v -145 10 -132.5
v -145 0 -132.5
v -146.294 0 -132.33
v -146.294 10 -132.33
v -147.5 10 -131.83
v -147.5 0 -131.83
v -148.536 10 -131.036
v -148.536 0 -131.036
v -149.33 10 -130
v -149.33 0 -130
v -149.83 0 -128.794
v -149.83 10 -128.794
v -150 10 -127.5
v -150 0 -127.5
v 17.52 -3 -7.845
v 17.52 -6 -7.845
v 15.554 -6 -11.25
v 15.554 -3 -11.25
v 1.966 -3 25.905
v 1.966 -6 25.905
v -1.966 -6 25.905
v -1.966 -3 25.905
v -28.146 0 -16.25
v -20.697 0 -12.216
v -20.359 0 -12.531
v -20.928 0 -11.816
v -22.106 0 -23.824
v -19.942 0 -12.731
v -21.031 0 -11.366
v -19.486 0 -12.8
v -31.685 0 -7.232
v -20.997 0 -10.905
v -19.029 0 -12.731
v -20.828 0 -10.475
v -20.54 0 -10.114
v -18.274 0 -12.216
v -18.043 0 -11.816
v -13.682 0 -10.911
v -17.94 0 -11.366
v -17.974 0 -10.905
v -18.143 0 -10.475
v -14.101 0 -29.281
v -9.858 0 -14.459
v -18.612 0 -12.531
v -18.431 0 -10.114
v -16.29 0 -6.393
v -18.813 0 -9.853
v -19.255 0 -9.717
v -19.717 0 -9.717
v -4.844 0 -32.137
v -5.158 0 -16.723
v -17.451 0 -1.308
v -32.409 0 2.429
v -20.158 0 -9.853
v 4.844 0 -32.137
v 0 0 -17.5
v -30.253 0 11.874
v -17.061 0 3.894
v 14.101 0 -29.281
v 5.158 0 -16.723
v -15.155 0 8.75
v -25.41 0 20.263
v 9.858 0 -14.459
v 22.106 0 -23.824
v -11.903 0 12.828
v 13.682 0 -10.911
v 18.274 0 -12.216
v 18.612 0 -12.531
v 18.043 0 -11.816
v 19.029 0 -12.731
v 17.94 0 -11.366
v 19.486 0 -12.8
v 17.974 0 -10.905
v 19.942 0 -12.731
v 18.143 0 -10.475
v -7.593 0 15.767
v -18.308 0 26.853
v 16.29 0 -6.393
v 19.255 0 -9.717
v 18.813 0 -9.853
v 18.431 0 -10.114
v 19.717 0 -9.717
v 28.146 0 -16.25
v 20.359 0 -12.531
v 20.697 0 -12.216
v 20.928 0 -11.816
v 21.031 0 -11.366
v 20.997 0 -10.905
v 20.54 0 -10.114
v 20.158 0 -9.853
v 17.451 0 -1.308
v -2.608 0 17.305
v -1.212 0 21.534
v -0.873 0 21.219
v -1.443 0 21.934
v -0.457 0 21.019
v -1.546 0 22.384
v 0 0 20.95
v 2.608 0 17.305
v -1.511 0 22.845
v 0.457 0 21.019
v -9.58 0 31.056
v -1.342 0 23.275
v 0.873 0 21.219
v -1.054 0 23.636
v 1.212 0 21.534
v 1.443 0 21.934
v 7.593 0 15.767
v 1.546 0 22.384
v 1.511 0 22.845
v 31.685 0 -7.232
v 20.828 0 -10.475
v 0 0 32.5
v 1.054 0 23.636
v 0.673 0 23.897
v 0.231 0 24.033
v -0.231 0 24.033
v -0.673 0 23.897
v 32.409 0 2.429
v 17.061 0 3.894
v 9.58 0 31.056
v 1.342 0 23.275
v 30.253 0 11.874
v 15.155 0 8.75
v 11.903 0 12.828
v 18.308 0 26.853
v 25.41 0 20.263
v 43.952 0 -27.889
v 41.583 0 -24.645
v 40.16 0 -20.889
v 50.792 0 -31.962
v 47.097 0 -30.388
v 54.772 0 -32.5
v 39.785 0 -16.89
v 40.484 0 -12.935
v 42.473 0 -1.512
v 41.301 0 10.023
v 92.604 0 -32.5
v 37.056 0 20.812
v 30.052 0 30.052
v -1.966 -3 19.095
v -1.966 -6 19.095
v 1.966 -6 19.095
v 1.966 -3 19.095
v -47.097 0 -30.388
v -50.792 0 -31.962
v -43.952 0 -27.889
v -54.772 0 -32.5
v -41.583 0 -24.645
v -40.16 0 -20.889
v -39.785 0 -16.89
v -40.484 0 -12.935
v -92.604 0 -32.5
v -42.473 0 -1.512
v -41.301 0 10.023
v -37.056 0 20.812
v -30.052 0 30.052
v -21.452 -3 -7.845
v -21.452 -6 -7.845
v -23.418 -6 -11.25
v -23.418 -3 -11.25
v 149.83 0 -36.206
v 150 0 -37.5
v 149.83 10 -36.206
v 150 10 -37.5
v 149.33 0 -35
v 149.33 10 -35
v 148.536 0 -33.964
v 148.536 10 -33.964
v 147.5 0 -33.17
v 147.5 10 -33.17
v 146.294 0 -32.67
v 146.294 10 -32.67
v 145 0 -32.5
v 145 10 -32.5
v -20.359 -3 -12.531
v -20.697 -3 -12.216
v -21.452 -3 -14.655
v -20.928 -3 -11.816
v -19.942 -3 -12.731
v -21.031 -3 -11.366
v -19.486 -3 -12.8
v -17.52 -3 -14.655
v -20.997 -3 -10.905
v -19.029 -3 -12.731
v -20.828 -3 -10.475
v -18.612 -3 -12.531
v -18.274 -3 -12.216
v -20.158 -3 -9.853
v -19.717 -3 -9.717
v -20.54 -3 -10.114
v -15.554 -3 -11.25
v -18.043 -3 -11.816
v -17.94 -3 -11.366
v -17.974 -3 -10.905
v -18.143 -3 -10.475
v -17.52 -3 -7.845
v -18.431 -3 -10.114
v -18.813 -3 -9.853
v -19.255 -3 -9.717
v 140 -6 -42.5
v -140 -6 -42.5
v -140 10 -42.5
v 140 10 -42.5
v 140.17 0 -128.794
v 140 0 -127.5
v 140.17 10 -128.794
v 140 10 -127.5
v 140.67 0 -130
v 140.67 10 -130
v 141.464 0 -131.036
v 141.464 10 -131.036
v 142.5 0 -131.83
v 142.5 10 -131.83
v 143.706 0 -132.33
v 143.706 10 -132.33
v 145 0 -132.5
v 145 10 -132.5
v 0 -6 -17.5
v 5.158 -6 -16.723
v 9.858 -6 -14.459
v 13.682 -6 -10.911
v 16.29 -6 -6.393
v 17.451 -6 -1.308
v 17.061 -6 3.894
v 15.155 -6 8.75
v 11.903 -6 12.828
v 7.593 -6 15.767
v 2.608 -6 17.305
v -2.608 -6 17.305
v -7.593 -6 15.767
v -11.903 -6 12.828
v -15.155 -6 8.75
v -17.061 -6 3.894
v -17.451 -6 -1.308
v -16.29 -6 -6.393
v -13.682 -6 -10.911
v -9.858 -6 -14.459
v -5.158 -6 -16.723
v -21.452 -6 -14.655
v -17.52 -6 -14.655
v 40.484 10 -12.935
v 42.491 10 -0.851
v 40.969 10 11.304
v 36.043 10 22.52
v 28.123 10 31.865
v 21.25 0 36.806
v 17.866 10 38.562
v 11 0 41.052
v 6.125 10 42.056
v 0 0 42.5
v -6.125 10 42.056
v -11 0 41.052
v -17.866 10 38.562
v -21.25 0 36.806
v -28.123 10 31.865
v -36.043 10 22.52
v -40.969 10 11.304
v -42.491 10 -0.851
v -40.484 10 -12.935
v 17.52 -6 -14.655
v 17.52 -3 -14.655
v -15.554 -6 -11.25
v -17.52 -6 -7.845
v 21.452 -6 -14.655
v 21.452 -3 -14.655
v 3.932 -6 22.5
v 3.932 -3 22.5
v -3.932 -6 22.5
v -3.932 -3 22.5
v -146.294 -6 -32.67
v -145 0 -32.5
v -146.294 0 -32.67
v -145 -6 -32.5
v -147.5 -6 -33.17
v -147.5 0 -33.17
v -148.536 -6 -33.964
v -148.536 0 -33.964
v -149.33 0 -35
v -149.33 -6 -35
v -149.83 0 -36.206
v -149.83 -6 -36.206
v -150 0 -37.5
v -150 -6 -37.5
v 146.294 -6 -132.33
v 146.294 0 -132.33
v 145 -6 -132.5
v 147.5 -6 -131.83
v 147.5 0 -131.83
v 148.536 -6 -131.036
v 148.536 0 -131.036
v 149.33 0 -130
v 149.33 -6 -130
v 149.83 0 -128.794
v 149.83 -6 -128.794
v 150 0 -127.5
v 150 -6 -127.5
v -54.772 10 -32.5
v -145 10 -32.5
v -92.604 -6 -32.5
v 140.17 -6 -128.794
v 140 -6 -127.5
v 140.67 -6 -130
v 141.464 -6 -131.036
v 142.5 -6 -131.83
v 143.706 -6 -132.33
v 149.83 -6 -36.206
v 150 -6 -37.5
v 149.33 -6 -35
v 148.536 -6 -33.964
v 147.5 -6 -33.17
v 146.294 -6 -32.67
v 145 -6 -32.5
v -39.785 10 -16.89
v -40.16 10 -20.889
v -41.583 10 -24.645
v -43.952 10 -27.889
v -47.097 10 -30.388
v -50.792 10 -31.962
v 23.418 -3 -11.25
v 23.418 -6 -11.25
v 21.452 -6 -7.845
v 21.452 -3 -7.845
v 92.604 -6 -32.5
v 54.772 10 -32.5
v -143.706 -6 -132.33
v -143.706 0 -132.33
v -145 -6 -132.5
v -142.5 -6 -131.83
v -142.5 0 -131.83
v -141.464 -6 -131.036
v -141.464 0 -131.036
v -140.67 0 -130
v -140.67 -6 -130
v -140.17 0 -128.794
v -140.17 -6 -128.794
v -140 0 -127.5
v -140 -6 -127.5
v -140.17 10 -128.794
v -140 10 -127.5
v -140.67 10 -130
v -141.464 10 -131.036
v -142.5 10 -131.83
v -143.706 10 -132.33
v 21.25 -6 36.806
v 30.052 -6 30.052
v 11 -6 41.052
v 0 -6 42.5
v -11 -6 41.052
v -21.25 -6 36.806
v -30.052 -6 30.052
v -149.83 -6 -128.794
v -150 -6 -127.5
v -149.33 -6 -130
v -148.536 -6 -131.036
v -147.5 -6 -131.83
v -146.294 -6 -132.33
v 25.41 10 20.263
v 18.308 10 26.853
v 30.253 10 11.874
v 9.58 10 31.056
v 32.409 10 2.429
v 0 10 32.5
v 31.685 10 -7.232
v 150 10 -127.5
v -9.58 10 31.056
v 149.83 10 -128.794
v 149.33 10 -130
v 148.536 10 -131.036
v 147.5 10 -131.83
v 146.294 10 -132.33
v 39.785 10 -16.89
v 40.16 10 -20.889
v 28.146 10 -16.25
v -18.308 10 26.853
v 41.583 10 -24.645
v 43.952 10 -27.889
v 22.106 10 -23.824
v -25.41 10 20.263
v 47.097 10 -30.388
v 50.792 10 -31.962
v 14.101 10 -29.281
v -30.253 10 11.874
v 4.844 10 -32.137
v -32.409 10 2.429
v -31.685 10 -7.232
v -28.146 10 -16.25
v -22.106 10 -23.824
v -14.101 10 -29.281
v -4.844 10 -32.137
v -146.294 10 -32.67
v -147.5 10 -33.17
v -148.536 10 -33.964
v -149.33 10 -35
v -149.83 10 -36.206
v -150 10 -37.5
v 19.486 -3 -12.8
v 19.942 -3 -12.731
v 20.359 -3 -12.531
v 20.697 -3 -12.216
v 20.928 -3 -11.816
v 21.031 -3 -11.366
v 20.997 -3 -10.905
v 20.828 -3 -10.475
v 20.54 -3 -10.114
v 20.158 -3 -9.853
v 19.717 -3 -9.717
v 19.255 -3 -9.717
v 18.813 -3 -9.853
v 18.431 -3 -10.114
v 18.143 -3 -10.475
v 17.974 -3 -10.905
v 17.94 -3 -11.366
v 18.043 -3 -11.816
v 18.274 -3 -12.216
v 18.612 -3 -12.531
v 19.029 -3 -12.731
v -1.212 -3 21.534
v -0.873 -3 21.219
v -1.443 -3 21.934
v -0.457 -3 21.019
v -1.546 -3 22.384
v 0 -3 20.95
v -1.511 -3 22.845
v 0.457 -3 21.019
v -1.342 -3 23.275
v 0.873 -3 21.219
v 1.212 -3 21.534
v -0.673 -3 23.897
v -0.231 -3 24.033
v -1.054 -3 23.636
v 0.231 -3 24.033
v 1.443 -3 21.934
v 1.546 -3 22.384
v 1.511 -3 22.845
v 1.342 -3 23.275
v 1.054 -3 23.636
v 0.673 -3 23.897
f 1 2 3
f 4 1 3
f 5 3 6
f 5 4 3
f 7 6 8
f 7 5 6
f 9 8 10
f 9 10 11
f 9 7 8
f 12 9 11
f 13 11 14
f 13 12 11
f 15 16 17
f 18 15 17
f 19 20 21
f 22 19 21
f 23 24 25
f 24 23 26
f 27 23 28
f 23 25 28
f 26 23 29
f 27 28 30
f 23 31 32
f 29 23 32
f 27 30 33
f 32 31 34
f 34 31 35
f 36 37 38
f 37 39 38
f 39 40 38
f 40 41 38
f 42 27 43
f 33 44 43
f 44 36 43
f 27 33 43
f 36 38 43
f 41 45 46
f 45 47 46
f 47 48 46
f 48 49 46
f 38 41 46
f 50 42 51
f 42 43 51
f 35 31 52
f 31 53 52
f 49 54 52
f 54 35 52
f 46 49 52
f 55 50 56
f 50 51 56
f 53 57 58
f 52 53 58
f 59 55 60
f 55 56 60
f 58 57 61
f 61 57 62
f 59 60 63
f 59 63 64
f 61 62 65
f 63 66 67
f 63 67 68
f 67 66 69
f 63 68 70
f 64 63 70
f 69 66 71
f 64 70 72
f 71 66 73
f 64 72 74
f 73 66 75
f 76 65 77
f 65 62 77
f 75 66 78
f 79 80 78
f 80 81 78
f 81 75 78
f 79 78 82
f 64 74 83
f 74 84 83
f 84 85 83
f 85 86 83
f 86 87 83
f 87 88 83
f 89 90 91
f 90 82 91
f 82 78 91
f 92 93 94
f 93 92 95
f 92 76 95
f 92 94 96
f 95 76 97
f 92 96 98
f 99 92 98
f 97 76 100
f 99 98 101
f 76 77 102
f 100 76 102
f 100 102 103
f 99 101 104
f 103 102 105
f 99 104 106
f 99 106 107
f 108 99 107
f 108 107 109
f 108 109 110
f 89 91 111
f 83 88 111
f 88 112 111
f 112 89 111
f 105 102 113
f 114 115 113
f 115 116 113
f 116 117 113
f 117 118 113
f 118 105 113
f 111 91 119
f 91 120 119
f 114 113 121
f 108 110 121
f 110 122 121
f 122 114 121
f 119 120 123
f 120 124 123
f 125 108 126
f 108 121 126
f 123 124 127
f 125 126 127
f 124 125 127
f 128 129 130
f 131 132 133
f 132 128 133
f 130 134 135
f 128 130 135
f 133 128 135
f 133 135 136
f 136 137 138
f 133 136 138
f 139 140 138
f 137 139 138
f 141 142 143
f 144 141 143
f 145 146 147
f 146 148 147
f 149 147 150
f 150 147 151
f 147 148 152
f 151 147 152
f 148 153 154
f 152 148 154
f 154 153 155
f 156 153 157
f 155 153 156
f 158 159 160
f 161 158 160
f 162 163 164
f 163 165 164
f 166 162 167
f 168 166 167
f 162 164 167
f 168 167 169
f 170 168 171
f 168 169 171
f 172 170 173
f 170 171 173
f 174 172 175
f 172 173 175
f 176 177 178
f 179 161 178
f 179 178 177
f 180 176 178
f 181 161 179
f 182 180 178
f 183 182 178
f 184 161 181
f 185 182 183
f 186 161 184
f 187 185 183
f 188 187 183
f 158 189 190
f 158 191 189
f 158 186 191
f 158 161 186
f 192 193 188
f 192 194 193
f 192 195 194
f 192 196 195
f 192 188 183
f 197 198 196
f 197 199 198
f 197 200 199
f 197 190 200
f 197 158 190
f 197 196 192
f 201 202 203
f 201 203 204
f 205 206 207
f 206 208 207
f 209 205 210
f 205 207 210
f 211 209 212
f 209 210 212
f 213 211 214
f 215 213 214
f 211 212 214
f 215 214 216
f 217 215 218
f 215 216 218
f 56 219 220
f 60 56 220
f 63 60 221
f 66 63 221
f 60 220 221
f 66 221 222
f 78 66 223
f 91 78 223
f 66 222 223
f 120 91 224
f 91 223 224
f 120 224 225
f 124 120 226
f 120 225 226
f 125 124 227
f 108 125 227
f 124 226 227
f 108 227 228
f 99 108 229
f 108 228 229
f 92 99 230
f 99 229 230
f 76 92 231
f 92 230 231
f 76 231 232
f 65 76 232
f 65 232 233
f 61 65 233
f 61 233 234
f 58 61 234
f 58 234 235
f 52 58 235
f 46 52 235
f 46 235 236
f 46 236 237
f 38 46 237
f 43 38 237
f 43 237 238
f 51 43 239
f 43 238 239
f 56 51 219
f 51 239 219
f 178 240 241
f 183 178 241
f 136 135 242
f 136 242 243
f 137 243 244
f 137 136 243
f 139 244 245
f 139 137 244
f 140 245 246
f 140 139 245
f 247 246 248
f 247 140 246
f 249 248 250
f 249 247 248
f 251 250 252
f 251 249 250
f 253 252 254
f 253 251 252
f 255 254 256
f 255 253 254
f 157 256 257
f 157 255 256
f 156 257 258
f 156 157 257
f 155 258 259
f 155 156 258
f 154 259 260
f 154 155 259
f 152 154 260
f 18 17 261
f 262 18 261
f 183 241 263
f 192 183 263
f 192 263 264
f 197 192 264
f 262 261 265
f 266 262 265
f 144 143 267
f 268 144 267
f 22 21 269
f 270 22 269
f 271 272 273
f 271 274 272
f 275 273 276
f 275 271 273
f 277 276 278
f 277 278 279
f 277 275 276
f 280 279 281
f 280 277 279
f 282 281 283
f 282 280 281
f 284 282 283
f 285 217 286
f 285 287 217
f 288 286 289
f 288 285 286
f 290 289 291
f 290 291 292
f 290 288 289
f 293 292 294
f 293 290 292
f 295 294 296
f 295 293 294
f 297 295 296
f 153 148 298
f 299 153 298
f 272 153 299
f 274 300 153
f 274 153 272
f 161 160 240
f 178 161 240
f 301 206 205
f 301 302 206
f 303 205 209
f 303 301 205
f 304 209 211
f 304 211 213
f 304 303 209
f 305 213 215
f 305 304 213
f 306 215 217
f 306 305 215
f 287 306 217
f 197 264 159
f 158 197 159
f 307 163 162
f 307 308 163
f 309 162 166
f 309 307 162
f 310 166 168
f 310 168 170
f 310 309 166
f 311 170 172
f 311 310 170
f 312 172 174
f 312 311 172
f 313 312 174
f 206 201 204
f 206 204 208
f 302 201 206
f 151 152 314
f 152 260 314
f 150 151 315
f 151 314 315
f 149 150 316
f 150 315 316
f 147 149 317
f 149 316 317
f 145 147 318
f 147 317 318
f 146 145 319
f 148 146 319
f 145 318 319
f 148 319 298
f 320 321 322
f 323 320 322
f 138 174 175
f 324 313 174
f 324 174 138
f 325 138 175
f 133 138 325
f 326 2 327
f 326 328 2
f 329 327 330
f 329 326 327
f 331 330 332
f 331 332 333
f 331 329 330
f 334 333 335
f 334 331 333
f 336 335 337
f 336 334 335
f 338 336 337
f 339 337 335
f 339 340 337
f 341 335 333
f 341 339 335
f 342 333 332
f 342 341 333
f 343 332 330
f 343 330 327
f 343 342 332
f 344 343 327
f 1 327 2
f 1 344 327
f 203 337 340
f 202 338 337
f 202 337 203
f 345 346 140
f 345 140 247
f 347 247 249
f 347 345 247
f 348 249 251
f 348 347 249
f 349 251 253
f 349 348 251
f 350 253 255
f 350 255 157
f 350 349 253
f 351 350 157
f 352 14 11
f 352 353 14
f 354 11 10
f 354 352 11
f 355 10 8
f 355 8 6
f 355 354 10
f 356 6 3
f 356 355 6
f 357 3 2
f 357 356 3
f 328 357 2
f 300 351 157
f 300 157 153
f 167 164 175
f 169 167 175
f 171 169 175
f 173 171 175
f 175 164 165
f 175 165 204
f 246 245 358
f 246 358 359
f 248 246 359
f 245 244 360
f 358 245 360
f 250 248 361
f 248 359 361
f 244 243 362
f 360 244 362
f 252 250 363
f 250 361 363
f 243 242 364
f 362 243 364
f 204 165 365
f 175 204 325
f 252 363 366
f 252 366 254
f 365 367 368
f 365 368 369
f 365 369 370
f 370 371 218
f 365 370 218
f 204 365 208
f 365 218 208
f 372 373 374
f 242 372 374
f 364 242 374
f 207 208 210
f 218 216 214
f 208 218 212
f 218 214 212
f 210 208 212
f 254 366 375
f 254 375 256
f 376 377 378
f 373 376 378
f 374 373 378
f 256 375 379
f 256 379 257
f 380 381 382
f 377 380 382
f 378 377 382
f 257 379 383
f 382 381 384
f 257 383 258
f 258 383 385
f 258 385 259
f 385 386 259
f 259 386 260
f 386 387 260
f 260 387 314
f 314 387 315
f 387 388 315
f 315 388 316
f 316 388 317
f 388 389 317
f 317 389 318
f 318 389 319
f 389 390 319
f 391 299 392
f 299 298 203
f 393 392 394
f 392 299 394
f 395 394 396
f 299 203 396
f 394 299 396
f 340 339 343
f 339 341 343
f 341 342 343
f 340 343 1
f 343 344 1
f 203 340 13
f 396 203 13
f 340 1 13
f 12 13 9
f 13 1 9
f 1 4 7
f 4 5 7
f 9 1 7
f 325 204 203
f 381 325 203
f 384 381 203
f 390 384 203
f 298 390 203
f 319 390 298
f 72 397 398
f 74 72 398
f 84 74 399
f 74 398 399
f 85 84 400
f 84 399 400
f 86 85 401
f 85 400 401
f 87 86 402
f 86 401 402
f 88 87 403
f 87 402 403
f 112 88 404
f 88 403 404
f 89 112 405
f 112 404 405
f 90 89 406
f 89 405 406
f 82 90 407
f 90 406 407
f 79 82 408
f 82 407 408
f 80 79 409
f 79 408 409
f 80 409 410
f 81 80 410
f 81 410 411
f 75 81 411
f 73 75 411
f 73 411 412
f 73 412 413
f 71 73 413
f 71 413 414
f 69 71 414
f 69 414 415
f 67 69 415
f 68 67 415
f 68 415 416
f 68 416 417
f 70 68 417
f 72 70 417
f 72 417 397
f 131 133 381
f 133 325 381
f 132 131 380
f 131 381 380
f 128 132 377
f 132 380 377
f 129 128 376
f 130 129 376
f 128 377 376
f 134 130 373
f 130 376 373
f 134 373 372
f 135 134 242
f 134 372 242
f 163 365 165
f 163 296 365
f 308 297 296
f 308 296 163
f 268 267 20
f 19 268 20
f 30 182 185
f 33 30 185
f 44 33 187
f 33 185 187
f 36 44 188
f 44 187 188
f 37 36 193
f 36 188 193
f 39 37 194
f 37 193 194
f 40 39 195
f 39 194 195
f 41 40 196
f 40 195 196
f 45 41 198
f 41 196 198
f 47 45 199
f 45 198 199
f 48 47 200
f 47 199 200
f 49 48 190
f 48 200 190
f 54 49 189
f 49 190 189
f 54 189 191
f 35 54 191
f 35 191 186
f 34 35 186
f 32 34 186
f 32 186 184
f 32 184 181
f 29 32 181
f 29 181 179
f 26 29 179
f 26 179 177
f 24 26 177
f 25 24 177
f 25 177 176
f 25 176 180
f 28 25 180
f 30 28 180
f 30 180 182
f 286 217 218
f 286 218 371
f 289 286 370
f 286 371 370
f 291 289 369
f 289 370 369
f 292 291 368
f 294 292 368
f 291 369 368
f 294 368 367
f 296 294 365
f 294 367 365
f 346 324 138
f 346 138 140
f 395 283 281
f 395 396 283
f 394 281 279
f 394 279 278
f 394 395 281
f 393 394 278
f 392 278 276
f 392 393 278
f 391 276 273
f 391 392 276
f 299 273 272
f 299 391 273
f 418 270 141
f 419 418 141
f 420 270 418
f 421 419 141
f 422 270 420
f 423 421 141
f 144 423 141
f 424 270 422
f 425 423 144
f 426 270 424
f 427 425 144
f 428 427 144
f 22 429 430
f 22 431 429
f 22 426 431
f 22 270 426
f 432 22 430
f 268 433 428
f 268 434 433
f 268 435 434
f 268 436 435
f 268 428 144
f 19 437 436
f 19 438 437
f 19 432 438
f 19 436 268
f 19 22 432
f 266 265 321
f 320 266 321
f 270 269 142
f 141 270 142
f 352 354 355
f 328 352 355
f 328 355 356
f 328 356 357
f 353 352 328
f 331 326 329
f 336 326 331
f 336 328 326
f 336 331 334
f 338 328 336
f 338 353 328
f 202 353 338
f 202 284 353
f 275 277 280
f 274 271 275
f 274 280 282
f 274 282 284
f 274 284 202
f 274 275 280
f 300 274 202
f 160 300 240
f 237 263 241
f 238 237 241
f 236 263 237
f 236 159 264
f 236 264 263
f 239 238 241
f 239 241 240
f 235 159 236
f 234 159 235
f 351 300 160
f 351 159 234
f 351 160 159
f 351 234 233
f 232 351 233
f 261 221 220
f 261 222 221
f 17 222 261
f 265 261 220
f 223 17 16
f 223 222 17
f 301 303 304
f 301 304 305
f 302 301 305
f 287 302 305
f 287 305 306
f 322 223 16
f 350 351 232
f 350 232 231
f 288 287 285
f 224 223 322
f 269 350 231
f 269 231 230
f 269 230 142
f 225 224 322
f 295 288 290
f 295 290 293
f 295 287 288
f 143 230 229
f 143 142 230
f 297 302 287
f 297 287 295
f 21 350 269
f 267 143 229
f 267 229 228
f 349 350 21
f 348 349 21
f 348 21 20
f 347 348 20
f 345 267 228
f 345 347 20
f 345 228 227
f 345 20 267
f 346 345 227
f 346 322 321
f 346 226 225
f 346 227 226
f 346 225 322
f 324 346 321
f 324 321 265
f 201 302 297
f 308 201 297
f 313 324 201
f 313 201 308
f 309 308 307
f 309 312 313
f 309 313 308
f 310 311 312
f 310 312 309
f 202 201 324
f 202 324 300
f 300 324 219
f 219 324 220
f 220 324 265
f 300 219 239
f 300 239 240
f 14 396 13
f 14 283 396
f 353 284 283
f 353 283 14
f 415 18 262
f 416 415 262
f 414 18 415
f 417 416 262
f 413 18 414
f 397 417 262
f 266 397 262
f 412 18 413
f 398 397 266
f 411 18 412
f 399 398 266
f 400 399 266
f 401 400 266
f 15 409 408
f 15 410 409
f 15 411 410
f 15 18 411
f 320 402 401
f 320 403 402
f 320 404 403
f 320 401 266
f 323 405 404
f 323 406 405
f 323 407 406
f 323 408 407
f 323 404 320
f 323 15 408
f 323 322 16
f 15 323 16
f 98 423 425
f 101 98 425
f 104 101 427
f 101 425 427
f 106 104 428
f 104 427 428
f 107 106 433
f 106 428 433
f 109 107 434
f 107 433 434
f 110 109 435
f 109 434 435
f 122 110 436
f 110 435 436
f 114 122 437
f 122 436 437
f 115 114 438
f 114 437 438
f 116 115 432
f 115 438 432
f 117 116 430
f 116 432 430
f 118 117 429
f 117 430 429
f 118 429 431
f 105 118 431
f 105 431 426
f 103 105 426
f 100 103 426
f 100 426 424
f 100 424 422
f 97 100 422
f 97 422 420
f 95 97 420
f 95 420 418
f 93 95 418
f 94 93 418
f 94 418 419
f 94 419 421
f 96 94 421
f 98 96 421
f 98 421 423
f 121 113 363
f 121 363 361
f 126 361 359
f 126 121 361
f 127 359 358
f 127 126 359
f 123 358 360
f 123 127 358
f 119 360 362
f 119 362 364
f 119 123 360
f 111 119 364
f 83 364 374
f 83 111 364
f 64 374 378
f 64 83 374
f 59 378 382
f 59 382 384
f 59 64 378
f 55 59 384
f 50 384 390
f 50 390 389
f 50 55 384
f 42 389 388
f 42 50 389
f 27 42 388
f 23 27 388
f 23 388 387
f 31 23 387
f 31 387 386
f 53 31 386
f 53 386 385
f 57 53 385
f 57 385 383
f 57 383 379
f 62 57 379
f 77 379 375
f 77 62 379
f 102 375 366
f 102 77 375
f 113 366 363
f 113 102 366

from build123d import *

# Parameters (mm, degrees)
SKETCH1_R           = 32.5
BOSS_EXTRUDE1_DEPTH = 10
FILLET1_R           = 5
FILLET2_R           = 15
BOSS_EXTRUDE2_START = 6
SKETCH2_R           = 1.55
SKETCH2_R_2         = 17.5
BOSS_EXTRUDE2_DEPTH = 6
CUT_EXTRUDE1_DEPTH  = 3


with BuildPart() as part:
    # Sketch1 → Boss-Extrude1 (new body)
    with BuildSketch(Plane(origin=(0, 0, 0), x_dir=(1, 0, 0), z_dir=(0, 1, 0))):
        with BuildLine():
            Line((0, 42.5), (140, 42.5))
            Line((140, 42.5), (140, 132.5))
            Line((140, 132.5), (150, 132.5))
            Line((150, 132.5), (150, 42.5))
            Line((150, 42.5), (150, 32.5))
            Line((150, 32.5), (27.386127875, 32.5))
            ThreePointArc((27.386127875, 32.5), (0, -42.5), (-27.386127875, 32.5))
            Line((-27.386127875, 32.5), (-150, 32.5))
            Line((-150, 32.5), (-150, 42.5))
            Line((-150, 42.5), (-150, 132.5))
            Line((-150, 132.5), (-140, 132.5))
            Line((-140, 132.5), (-140, 42.5))
            Line((-140, 42.5), (0, 42.5))
        make_face()
        with Locations(Location((0, 0, 0), (0, 0, 270))):
            Circle(SKETCH1_R, mode=Mode.SUBTRACT)
    extrude(amount=BOSS_EXTRUDE1_DEPTH)

    # Fillet1
    fillet1_edges = [part.edges().sort_by_distance(p)[0] for p in [
        (150, 5, -132.5),
        (140, 5, -132.5),
        (150, 5, -32.5),
        (-150, 5, -32.5),
        (-140, 5, -132.5),
        (-150, 5, -132.5),
    ]]
    fillet(fillet1_edges, radius=FILLET1_R - 0.0001)  # a hair under: the kernel refuses the full size

    # Fillet2
    fillet2_edges = [part.edges().sort_by_distance(p)[0] for p in [
        (27.386127875, 5, -32.5),
        (-27.386127875, 5, -32.5),
    ]]
    fillet(fillet2_edges, radius=FILLET2_R)

    # Sketch2 → Boss-Extrude2 (add)
    with BuildSketch(Plane.XZ.offset(BOSS_EXTRUDE2_START)):
        with BuildLine():
            Line((-30.0520382, 30.0520382), (-92.604076401, -32.5))
            Line((-92.604076401, -32.5), (-145, -32.5))
            ThreePointArc((-145, -32.5), (-148.535533906, -33.964466094), (-150, -37.5))
            Line((-150, -37.5), (-150, -127.5))
            ThreePointArc((-150, -127.5), (-148.535533906, -131.035533906), (-145, -132.5))
            ThreePointArc((-145, -132.5), (-141.464466094, -131.035533906), (-140, -127.5))
            Line((-140, -127.5), (-140, -42.5))
            Line((-140, -42.5), (140, -42.5))
            Line((140, -42.5), (140, -127.5))
            ThreePointArc((140, -127.5), (141.464466094, -131.035533906), (145, -132.5))
            ThreePointArc((145, -132.5), (148.535533906, -131.035533906), (150, -127.5))
            Line((150, -127.5), (150, -37.5))
            ThreePointArc((150, -37.5), (148.535533906, -33.964466094), (145, -32.5))
            Line((145, -32.5), (92.604076401, -32.5))
            Line((92.604076401, -32.5), (30.0520382, 30.0520382))
            ThreePointArc((30.0520382, 30.0520382), (0, 42.5), (-30.0520382, 30.0520382))
        make_face()
        with Locations(Location((0, 22.5, 0), (0, 0, 270))):
            Circle(SKETCH2_R, mode=Mode.SUBTRACT)
        with Locations(Location((19.485571585, -11.25, 0), (0, 0, 270))):
            Circle(SKETCH2_R, mode=Mode.SUBTRACT)
        with Locations(Location((-19.485571585, -11.25, 0), (0, 0, 270))):
            Circle(SKETCH2_R, mode=Mode.SUBTRACT)
        with Locations(Location((0, 0, 0), (0, 0, 270))):
            Circle(SKETCH2_R_2, mode=Mode.SUBTRACT)
    extrude(amount=-BOSS_EXTRUDE2_DEPTH)

    # Sketch4 → Cut-Extrude1 (cut)
    with BuildSketch(Plane.XZ.offset(6)):
        Polygon((17.519605061, -14.655153906), (21.451538109, -14.655153906), (23.417504634, -11.25), (21.451538109, -7.844846094), (17.519605061, -7.844846094), (15.553638537, -11.25), align=None)
        Polygon((3.931933048, 22.5), (1.965966524, 25.905153906), (-1.965966524, 25.905153906), (-3.931933048, 22.5), (-1.965966524, 19.094846094), (1.965966524, 19.094846094), align=None)
        Polygon((-21.451538109, -7.844846094), (-23.417504634, -11.25), (-21.451538109, -14.655153906), (-17.519605061, -14.655153906), (-15.553638537, -11.25), (-17.519605061, -7.844846094), align=None)
    extrude(amount=-CUT_EXTRUDE1_DEPTH, mode=Mode.SUBTRACT)


solid = part.part
